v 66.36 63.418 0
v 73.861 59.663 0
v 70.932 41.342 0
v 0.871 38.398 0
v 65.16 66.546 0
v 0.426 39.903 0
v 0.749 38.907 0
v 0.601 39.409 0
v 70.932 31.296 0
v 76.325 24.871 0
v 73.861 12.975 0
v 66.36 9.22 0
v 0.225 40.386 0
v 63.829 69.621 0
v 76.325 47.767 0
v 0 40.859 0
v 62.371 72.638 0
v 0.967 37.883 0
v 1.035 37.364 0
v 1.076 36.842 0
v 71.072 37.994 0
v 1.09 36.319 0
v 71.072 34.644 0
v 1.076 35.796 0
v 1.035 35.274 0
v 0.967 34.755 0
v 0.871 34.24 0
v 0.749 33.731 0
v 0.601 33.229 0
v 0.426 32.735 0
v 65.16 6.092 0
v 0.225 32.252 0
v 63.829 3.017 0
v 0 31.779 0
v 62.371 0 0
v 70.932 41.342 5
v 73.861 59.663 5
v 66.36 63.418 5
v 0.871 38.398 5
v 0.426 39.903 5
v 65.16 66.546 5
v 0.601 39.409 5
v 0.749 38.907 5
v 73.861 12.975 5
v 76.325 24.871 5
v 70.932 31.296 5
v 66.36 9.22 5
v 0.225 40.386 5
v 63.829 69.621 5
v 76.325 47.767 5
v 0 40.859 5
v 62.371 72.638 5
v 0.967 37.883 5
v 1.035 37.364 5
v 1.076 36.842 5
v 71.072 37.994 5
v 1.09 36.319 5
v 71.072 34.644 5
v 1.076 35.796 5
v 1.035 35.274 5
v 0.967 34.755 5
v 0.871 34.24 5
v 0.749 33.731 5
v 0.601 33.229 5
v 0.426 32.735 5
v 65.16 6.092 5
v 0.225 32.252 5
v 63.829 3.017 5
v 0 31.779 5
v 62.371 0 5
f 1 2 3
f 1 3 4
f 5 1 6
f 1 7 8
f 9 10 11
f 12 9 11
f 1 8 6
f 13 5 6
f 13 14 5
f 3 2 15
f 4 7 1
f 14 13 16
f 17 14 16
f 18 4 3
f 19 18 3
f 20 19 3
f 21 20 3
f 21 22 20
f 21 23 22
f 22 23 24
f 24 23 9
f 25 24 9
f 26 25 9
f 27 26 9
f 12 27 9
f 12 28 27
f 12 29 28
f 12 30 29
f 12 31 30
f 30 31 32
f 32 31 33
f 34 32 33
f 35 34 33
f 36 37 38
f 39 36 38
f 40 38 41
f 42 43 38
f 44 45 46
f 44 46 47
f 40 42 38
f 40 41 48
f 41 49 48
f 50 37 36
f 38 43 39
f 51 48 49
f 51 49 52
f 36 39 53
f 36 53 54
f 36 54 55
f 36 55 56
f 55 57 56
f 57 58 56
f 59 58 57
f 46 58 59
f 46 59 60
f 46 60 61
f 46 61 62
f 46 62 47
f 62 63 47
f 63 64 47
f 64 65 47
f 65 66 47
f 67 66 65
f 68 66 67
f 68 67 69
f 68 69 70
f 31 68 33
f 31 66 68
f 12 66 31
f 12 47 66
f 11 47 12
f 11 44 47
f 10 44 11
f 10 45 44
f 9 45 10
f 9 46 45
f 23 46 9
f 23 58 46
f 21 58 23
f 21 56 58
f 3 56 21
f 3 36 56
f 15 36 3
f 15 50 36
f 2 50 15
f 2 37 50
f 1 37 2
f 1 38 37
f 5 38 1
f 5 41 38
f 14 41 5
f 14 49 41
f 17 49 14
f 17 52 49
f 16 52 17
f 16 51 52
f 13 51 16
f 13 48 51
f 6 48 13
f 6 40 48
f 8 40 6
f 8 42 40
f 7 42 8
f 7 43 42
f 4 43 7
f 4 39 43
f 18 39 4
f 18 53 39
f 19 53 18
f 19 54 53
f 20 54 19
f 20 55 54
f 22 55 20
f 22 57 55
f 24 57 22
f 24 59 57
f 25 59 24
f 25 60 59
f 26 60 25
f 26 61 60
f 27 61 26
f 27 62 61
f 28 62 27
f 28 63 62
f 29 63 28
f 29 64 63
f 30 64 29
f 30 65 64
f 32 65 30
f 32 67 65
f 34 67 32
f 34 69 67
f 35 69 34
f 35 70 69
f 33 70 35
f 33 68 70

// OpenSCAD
$fn = 32;

// ----------------------------------------------------------------------
// Gear sector: 2 teeth on 54 degrees
// ----------------------------------------------------------------------

// --- parameters (mm) ---
sector_angle = 54;        // sector angle, degrees
root_r = 80;              // root circle radius
tooth_h = 6;              // tooth height over the root circle
teeth = 2;                // number of teeth on the sector
hub_r = 10;               // hub bore radius
plate_t = 5;              // sector thickness, Z
arc_step = 3;             // sampling step of the root/hub arcs, degrees

tip_r = root_r + tooth_h;  // tip circle radius

profile = [[62.371, 0], [63.829, 3.017], [65.16, 6.092], [66.36, 9.22], [73.861, 12.975], [76.325, 24.871], [70.932, 31.296], [71.072, 34.644], [71.072, 37.994], [70.932, 41.342], [76.325, 47.767], [73.861, 59.663], [66.36, 63.418], [65.16, 66.546], [63.829, 69.621], [62.371, 72.638], [0, 40.859], [0.225, 40.386], [0.426, 39.903], [0.601, 39.409], [0.749, 38.907], [0.871, 38.398], [0.967, 37.883], [1.035, 37.364], [1.076, 36.842], [1.09, 36.319], [1.076, 35.796], [1.035, 35.274], [0.967, 34.755], [0.871, 34.24], [0.749, 33.731], [0.601, 33.229], [0.426, 32.735], [0.225, 32.252], [0, 31.779]];  // primary outline, 35 points, counter clockwise

// --- the one profile operation ---
linear_extrude(height = plate_t) polygon(points = profile);
